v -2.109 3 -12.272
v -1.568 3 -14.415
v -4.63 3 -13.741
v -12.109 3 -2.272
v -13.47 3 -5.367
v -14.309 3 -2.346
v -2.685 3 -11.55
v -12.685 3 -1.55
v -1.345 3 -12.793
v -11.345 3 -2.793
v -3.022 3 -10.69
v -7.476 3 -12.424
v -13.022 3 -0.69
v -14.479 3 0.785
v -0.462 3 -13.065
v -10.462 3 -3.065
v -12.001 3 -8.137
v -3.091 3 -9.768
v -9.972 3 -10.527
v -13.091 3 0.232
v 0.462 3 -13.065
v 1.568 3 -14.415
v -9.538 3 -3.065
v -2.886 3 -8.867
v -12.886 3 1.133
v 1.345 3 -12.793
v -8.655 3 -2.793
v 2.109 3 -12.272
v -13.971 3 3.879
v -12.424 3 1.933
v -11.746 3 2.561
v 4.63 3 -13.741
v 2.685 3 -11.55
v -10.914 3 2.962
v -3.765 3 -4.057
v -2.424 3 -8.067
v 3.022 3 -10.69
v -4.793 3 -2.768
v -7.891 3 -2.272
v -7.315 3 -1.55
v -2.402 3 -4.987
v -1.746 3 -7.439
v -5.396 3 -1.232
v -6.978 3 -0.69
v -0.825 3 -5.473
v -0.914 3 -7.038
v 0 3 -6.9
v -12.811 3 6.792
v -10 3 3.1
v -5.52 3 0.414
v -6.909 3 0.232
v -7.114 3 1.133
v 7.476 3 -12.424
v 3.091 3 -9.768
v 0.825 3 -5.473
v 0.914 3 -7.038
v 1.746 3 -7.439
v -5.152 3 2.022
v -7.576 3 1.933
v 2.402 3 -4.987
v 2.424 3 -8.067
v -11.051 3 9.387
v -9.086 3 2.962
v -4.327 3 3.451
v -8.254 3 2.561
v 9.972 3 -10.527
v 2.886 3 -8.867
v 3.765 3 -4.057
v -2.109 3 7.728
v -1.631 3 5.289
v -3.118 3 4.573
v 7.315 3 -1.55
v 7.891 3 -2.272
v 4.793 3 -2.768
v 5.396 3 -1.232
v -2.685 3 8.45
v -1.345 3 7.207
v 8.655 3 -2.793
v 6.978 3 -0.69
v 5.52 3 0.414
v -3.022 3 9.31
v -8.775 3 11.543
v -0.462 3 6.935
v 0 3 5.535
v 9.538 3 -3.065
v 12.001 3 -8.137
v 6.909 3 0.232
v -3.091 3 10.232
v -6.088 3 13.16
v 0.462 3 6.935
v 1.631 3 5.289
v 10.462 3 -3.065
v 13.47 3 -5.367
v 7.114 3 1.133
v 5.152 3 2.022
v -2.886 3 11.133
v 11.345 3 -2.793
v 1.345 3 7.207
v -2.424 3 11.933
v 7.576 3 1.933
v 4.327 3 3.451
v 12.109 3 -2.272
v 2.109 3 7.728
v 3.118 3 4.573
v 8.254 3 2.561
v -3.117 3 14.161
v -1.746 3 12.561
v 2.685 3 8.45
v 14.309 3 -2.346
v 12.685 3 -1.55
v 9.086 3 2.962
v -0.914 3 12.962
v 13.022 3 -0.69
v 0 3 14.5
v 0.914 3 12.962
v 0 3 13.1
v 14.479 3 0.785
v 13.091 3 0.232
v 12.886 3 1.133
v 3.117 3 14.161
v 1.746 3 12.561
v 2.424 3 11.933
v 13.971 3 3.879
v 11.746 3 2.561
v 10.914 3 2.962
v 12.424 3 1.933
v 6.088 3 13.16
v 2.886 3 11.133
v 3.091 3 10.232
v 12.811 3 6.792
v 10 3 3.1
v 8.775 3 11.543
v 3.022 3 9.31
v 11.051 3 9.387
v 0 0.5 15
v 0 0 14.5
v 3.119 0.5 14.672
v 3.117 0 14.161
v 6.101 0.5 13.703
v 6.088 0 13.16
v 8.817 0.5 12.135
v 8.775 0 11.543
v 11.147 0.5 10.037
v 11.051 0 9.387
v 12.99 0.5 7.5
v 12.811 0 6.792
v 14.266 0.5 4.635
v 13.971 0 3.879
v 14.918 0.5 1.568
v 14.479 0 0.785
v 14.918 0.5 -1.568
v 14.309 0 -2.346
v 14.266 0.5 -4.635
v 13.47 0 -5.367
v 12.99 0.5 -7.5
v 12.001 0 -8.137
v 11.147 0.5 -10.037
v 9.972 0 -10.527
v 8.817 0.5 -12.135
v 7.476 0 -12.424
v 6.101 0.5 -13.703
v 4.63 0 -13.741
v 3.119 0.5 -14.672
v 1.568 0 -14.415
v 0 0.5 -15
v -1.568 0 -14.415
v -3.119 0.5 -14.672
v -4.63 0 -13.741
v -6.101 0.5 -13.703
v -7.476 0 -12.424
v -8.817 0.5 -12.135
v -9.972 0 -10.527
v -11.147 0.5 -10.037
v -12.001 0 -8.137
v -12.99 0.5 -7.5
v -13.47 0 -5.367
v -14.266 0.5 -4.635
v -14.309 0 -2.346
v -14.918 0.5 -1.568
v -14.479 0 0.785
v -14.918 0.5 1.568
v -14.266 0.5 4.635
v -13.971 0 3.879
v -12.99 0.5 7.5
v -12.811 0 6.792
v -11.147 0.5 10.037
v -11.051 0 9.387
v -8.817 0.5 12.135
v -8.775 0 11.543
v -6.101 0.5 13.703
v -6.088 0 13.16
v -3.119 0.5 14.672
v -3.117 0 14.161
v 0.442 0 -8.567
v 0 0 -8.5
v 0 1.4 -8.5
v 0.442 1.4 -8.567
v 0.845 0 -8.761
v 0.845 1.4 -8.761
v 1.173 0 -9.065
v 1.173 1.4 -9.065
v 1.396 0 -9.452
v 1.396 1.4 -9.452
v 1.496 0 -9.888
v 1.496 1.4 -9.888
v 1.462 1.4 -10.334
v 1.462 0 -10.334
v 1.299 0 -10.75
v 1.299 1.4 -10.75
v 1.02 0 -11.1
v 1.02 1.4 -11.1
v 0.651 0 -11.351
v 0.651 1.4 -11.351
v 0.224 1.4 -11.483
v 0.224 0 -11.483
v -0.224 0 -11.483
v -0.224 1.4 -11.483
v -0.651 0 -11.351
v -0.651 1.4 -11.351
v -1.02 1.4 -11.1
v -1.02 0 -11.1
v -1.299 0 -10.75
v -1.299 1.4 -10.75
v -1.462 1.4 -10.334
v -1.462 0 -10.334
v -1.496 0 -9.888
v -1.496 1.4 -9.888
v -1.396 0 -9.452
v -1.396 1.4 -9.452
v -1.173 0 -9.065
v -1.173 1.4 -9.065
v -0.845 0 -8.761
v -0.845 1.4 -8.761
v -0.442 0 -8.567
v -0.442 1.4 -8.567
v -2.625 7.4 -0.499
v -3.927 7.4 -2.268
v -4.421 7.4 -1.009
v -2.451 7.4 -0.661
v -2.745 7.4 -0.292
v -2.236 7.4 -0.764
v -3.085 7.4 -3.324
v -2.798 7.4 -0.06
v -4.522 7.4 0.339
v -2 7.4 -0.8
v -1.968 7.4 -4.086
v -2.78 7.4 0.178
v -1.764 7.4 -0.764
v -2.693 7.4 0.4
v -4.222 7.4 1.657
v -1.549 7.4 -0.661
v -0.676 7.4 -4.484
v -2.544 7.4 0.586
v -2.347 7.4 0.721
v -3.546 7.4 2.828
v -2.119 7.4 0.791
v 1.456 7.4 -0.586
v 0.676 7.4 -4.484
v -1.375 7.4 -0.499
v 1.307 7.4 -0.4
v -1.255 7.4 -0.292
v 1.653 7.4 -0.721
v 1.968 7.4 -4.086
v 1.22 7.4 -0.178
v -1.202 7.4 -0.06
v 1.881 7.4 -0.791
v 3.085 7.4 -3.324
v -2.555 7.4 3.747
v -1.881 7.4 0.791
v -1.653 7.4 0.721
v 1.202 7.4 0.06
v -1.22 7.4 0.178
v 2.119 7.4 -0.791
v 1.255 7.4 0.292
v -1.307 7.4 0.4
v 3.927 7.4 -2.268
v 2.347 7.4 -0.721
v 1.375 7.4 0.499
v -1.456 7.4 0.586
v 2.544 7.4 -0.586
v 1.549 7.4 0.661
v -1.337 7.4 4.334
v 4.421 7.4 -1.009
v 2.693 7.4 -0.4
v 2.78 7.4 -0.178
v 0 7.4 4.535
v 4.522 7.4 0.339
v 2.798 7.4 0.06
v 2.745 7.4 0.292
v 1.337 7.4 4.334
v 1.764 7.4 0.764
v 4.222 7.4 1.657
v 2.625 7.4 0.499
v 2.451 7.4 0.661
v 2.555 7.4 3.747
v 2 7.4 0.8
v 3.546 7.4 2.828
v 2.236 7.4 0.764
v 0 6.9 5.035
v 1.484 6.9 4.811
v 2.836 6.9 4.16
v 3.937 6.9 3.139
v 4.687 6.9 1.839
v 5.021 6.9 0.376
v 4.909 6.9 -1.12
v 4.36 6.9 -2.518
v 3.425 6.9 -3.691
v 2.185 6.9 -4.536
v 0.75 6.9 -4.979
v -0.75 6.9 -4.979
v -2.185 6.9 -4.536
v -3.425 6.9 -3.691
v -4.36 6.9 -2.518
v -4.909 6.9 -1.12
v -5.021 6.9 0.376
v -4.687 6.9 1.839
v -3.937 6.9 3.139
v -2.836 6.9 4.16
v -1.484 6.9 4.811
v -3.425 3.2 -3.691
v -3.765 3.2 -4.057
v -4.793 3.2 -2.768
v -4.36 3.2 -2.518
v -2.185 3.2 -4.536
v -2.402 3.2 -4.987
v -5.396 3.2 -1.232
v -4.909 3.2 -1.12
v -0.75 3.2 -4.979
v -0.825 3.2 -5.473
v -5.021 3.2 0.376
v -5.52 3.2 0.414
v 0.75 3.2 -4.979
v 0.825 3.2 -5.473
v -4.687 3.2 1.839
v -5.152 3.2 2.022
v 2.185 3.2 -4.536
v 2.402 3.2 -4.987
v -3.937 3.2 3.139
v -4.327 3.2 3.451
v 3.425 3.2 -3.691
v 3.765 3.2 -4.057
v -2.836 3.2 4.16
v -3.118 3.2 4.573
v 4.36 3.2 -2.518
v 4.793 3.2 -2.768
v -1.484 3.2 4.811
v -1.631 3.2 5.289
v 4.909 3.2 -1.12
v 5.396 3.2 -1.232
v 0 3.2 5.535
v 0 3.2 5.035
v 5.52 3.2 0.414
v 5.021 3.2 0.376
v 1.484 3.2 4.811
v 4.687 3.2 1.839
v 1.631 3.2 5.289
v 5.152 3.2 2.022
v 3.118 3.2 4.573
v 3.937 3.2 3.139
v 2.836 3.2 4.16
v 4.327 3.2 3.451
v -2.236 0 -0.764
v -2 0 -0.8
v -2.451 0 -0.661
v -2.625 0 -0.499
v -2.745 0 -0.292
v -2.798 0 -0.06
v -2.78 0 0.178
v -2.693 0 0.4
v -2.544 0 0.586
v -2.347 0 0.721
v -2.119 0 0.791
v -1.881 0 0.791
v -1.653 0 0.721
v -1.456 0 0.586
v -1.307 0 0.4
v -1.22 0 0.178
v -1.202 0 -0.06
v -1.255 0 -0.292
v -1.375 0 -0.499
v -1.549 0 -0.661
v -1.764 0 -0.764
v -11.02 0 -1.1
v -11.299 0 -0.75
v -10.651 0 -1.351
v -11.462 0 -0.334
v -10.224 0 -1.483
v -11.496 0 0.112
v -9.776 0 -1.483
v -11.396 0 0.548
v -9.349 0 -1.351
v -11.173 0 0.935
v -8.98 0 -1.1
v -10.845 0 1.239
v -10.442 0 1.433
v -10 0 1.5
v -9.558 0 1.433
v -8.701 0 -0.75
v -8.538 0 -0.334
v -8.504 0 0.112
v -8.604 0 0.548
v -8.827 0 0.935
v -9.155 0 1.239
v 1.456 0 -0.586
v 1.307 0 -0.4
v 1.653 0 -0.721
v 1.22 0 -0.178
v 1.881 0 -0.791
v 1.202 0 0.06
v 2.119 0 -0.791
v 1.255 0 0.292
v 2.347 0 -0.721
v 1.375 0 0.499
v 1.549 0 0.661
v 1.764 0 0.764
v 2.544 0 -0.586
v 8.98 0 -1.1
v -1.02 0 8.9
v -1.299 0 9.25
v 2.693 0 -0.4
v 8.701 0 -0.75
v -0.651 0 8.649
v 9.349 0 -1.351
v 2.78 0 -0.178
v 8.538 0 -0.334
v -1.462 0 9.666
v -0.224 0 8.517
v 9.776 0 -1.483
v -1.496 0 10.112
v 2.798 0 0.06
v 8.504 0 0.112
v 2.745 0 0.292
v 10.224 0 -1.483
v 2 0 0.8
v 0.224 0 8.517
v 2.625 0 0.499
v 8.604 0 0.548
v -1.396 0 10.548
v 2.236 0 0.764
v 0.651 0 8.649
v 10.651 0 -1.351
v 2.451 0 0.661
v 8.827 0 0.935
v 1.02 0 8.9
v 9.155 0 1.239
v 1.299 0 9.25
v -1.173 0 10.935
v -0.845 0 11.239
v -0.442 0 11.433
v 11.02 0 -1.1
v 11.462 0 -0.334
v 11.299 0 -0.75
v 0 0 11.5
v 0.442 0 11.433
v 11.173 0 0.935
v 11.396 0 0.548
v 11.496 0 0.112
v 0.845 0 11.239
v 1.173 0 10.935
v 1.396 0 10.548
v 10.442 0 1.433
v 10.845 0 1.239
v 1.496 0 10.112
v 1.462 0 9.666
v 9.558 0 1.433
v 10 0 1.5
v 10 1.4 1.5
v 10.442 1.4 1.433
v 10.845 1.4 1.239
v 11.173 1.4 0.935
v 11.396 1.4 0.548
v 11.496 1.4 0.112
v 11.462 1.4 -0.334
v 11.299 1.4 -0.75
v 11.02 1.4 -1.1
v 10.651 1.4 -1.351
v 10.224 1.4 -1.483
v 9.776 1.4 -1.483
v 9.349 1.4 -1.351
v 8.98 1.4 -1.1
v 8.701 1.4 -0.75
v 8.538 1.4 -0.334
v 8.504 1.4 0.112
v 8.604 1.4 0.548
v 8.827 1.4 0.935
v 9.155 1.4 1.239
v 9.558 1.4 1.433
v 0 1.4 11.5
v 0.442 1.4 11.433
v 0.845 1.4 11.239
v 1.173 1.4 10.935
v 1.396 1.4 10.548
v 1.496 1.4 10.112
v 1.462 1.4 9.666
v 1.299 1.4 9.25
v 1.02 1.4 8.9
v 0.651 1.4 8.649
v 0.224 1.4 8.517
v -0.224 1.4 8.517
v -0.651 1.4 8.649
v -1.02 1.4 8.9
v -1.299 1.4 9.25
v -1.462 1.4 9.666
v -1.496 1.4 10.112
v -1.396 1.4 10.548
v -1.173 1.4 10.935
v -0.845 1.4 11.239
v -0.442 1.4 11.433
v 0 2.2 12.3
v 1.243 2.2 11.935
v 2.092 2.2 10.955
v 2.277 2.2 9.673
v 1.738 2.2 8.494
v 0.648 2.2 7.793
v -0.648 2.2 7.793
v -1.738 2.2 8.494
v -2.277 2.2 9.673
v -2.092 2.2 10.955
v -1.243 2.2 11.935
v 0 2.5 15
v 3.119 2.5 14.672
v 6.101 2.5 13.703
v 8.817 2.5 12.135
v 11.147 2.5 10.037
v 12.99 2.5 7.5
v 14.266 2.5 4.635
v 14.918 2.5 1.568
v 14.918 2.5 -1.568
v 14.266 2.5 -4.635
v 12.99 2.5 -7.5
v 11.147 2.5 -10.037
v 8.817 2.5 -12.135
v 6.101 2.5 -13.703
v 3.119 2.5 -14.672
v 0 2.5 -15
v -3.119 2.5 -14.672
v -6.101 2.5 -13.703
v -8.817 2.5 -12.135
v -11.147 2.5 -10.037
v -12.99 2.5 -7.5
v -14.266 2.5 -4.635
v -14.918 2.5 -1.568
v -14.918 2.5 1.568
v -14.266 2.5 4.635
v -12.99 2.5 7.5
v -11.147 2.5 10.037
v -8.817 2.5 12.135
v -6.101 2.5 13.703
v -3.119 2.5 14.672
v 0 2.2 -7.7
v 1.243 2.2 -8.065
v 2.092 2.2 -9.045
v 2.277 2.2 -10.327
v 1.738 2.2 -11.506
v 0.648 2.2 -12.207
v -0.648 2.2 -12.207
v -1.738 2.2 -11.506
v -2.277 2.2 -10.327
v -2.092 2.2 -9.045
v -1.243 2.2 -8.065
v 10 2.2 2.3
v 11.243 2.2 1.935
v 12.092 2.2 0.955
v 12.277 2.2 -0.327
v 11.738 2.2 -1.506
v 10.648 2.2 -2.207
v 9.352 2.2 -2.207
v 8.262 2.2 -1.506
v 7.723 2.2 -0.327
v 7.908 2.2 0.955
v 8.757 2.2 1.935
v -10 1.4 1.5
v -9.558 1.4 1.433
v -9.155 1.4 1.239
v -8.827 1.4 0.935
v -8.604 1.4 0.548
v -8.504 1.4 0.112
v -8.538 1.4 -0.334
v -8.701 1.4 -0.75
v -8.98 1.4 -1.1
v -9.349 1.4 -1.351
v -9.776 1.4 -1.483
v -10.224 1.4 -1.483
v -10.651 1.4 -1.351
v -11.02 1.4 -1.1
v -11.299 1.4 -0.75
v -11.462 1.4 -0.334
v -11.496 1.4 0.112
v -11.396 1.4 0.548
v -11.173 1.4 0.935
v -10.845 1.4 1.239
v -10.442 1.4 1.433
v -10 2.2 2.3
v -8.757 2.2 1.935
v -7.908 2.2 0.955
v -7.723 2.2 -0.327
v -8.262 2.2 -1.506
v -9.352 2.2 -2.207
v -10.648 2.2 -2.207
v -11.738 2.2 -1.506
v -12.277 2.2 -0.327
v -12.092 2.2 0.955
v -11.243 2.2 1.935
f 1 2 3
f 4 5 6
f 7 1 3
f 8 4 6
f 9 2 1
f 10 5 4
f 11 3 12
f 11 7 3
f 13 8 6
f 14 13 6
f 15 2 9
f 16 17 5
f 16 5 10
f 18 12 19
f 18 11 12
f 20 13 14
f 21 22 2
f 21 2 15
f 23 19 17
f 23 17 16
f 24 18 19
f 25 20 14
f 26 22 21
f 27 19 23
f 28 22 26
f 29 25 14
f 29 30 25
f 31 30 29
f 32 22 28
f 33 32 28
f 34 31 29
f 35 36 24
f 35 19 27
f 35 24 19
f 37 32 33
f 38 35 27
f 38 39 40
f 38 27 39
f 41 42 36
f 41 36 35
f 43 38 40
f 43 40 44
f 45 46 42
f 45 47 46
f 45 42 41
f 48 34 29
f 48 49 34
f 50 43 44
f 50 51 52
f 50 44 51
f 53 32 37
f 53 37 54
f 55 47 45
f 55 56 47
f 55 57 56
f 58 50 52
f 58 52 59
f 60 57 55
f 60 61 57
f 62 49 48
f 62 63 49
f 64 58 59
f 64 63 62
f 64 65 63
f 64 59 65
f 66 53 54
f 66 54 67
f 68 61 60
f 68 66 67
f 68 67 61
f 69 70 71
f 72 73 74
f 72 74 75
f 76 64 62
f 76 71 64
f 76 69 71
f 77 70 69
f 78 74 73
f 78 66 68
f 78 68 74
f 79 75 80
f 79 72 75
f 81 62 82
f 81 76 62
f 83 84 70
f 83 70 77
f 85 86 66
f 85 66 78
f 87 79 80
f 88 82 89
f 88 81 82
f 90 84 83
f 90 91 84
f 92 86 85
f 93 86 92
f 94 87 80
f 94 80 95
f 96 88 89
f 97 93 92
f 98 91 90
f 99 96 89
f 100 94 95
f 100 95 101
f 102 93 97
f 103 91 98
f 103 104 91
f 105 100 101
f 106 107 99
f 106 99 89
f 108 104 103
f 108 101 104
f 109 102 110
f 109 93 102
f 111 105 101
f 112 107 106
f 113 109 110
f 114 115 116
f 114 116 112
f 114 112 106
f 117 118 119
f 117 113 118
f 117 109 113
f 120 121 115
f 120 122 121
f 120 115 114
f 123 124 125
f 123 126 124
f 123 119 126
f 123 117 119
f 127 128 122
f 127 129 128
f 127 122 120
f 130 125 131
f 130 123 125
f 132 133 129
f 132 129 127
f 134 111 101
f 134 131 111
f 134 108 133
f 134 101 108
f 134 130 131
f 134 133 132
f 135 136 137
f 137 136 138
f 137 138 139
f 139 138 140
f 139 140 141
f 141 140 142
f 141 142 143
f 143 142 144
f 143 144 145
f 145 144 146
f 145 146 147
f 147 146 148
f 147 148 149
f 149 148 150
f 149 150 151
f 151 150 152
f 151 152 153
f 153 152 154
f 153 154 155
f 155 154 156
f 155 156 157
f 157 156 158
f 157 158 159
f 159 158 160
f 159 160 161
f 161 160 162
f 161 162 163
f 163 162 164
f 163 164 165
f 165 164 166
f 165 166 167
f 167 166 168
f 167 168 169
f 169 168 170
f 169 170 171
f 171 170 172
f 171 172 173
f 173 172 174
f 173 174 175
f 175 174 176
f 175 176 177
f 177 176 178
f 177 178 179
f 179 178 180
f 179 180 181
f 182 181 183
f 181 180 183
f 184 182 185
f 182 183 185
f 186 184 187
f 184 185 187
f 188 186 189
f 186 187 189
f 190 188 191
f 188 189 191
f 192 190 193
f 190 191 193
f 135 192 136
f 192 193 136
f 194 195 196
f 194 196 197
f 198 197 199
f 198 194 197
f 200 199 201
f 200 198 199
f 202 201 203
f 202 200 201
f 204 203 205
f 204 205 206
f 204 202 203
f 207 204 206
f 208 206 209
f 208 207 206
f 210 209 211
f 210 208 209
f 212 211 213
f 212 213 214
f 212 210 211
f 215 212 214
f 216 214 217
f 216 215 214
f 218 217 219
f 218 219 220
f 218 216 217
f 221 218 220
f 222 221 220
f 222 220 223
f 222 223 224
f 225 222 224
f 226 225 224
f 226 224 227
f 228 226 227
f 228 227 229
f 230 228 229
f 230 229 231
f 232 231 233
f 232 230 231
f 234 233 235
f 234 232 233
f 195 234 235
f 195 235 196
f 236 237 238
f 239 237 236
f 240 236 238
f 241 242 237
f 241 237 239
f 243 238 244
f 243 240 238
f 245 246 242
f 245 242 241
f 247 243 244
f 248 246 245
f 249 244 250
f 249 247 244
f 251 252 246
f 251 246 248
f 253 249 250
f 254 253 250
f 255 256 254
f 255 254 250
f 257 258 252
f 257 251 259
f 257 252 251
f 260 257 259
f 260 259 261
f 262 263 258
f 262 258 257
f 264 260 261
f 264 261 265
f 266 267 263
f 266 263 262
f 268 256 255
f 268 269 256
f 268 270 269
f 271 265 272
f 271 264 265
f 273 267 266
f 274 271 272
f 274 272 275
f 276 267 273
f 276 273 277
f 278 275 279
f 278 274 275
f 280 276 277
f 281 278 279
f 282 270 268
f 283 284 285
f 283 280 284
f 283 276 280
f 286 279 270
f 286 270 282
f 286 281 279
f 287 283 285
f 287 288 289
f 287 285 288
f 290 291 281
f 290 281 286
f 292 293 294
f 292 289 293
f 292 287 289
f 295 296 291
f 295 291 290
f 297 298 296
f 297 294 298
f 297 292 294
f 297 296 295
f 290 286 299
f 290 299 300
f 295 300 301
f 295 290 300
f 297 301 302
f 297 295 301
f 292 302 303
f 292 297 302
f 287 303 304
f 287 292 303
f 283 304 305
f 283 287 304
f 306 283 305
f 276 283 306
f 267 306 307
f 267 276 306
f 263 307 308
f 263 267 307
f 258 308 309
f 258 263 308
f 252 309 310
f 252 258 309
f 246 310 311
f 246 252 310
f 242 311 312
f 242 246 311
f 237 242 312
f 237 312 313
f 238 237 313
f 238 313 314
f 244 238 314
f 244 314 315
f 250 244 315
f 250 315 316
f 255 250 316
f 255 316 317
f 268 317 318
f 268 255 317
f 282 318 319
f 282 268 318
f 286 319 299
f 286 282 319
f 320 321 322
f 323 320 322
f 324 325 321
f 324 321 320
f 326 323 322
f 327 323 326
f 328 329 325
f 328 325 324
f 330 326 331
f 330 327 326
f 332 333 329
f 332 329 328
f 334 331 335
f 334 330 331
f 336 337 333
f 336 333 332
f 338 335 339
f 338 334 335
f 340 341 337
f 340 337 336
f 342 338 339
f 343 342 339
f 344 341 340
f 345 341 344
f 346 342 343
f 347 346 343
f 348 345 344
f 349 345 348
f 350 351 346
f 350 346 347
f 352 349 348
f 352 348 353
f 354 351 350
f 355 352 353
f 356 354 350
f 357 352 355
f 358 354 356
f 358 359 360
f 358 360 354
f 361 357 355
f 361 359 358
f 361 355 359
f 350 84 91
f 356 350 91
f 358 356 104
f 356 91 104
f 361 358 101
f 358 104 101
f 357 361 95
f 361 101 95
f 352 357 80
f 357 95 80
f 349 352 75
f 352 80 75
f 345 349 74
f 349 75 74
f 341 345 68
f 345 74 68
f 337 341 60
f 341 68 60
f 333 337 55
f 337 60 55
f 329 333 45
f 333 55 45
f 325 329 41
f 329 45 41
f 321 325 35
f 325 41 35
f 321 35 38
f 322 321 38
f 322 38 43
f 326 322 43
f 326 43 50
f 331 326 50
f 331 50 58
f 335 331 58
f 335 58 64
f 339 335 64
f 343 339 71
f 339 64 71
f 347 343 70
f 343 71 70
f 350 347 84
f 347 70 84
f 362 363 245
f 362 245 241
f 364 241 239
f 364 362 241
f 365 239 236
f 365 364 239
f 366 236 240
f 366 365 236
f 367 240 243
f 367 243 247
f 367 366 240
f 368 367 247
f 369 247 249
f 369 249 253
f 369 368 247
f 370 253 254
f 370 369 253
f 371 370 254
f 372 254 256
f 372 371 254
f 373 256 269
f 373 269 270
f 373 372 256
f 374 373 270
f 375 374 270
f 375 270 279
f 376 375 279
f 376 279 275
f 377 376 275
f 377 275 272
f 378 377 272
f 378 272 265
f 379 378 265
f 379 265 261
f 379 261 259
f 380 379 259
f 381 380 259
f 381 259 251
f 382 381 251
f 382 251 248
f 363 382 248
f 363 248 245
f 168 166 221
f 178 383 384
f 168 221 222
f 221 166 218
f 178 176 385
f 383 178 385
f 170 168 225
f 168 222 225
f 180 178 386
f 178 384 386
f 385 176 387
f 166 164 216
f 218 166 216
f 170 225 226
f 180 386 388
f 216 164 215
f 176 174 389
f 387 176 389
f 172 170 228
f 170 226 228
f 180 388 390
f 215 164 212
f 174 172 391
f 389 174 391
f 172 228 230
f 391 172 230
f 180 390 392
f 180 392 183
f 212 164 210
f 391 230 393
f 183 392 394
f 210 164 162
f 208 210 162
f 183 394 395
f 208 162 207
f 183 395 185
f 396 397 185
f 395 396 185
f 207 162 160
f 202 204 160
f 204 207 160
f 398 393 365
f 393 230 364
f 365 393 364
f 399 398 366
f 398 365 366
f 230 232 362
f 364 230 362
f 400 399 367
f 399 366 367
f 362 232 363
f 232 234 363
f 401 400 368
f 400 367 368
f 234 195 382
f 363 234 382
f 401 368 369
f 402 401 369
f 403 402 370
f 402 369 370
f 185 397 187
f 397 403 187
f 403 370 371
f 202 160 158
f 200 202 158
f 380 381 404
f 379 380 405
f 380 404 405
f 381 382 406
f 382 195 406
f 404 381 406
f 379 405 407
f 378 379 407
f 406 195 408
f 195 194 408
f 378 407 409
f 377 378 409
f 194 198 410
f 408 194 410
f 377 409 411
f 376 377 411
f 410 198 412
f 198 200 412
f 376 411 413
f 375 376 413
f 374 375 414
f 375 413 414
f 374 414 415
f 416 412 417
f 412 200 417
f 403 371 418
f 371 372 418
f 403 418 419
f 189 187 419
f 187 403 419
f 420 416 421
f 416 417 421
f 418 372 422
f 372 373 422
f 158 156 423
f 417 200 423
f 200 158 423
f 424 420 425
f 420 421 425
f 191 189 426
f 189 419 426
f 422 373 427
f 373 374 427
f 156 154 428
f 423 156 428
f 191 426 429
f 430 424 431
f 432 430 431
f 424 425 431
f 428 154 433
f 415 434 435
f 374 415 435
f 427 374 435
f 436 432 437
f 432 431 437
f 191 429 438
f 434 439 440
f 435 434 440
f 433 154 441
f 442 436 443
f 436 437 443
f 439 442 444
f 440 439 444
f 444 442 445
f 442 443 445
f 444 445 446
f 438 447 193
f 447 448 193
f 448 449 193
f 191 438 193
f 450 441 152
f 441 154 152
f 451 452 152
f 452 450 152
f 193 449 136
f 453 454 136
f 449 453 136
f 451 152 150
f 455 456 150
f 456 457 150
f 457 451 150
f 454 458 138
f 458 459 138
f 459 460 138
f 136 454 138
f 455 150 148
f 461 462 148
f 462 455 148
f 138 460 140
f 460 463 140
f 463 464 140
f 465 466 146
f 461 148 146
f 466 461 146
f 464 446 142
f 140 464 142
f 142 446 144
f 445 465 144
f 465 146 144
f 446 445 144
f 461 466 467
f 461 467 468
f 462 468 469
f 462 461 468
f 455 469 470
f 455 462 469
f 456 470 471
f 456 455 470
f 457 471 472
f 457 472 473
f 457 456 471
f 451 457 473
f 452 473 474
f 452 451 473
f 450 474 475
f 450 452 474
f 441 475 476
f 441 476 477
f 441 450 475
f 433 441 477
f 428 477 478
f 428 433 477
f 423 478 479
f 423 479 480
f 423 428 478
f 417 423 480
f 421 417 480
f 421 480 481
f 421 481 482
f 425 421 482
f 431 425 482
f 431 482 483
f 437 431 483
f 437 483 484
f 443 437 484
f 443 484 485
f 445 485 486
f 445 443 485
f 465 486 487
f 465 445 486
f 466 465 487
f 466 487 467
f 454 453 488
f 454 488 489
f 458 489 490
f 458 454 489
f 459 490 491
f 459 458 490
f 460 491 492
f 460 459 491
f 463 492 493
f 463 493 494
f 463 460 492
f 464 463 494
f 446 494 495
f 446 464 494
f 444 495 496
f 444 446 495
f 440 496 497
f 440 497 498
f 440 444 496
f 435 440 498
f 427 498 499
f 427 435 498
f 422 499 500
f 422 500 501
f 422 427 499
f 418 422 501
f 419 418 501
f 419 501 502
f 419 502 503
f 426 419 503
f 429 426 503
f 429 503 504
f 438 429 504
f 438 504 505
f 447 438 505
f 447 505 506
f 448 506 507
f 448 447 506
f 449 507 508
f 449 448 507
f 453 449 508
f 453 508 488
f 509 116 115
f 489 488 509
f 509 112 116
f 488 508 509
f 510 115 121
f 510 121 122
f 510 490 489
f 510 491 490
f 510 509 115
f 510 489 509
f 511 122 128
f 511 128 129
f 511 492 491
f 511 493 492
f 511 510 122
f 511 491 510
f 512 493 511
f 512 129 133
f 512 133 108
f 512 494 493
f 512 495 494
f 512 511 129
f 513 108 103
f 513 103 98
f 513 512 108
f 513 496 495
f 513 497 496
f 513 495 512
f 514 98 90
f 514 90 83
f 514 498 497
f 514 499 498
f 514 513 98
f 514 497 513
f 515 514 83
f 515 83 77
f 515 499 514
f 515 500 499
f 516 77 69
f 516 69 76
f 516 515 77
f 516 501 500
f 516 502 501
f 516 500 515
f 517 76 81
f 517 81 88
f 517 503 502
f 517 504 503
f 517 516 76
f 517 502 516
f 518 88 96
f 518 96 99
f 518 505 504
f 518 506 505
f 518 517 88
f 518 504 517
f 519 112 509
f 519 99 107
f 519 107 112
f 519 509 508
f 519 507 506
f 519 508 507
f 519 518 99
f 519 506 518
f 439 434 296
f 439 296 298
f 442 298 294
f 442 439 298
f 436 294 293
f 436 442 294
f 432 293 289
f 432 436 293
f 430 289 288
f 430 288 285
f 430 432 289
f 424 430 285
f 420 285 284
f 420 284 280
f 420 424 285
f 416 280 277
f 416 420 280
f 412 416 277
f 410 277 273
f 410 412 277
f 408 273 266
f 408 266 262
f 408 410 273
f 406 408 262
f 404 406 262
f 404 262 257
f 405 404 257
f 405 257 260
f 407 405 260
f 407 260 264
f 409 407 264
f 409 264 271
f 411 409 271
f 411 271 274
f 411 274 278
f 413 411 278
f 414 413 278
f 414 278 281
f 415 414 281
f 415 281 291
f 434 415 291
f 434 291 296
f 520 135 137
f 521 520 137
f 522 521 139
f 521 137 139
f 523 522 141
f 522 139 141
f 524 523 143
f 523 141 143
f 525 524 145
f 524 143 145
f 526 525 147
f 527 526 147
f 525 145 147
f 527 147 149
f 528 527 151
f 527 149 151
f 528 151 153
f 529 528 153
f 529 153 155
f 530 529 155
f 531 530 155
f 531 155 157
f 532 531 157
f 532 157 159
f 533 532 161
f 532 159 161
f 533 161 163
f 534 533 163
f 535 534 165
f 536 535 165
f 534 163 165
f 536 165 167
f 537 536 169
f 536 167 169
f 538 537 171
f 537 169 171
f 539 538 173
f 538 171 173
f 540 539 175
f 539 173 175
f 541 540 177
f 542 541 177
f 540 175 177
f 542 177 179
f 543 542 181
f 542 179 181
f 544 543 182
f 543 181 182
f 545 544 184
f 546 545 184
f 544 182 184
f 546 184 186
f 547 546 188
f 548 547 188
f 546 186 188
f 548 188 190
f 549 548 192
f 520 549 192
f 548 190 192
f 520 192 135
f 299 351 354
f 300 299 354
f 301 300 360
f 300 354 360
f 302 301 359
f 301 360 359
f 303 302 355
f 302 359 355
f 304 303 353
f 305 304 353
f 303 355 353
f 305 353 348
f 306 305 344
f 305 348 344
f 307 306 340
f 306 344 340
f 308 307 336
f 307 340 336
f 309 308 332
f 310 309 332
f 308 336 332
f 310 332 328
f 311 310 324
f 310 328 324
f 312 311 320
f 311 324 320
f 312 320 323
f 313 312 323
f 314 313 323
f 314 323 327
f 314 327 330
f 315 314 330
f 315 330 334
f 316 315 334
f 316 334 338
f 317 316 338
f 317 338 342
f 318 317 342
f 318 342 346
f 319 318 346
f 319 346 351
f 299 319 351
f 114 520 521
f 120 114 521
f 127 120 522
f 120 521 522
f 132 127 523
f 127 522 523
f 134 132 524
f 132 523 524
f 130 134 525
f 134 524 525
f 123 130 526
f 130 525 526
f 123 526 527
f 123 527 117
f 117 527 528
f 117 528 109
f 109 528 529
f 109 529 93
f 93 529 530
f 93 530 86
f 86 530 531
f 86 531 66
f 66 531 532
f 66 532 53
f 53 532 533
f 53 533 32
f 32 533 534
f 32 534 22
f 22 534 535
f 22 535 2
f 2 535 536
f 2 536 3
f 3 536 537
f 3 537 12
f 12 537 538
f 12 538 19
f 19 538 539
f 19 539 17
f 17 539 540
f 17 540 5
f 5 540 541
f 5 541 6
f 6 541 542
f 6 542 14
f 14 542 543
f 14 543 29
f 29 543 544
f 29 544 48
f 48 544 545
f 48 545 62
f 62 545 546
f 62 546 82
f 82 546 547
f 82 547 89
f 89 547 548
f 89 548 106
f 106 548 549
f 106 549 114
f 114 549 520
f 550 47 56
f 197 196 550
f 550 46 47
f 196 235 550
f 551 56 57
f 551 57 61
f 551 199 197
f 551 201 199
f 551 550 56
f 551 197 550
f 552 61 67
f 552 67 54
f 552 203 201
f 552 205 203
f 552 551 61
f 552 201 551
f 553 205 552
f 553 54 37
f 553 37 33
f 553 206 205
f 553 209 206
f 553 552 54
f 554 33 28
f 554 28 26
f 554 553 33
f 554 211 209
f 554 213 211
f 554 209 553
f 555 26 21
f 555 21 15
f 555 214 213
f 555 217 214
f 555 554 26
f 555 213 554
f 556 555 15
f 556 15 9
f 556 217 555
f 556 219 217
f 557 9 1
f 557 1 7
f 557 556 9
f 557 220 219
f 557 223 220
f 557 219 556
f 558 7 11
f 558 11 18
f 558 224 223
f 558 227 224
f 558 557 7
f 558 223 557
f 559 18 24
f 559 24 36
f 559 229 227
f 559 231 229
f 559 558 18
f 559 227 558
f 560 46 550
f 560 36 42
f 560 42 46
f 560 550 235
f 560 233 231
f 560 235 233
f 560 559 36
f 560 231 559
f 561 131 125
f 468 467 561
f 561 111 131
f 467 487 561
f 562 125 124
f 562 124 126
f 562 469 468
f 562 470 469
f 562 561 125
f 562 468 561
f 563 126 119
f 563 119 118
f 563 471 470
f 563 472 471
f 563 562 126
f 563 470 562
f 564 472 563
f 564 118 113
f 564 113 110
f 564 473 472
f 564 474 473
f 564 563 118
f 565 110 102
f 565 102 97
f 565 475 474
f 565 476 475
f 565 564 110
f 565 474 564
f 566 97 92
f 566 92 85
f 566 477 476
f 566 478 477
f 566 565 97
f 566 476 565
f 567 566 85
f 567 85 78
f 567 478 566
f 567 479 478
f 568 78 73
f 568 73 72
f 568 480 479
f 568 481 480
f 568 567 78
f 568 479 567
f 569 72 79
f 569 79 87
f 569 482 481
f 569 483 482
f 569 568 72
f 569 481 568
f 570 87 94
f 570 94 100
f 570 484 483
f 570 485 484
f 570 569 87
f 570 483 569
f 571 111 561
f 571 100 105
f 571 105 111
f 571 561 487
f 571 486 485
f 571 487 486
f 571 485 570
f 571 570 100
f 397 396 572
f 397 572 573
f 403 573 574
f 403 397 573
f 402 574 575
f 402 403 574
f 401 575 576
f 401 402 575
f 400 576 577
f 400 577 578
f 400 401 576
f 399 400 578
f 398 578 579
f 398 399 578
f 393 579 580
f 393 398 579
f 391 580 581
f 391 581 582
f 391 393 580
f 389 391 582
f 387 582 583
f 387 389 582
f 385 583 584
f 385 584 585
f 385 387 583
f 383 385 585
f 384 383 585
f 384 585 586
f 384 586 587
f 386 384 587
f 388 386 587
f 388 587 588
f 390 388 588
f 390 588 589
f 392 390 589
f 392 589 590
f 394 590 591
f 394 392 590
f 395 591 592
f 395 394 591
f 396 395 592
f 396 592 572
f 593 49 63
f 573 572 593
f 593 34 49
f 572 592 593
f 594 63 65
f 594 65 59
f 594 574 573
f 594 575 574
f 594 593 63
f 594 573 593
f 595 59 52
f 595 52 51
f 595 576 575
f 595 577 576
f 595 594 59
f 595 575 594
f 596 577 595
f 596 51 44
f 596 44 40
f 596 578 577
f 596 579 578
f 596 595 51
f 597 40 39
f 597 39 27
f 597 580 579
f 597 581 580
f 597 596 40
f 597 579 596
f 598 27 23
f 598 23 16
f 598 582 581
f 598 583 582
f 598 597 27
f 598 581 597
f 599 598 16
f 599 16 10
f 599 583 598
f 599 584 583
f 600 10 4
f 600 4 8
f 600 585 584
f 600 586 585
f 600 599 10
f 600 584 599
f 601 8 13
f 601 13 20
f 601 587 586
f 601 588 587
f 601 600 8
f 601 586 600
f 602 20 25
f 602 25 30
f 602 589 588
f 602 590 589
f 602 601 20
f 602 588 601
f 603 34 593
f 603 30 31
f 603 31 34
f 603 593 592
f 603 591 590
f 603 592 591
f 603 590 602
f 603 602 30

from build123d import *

# Parameters (mm, degrees)
SKETCH_1_R          = 15
SKETCH_1_R_2        = 1.5
EXTRUDE_1_DEPTH     = 3
SKETCH_2_R          = 5.035
SKETCH_2_R_2        = 0.8
EXTRUDE_2_DEPTH     = 4.4
SKETCH_4_R          = 5.535
EXTRUDE_3_DEPTH     = 0.2
CHAMFER_1_SIZE      = 0.5
CHAMFER_3_SIZE      = 0.5
CHAMFER_4_SIZE      = 1.6
CUT_EXTRUDE_START   = -10
SKETCH_5_R          = 0.8
CUT_EXTRUDE_1_DEPTH = 10


with BuildPart() as part:
    # 草图1 → 凸台-拉伸1 (new body)
    with BuildSketch(Plane(origin=(0, 0, 0), x_dir=(1, 0, 0), z_dir=(0, 1, 0))):
        with Locations(Location((0, 0, 0), (0, 0, 270))):
            Circle(SKETCH_1_R)
        with Locations(Location((0, 10, 0), (0, 0, 270))):
            Circle(SKETCH_1_R_2, mode=Mode.SUBTRACT)
        with Locations(Location((10, 0, 0), (0, 0, 270))):
            Circle(SKETCH_1_R_2, mode=Mode.SUBTRACT)
        with Locations(Location((0, -10, 0), (0, 0, 270))):
            Circle(SKETCH_1_R_2, mode=Mode.SUBTRACT)
        with Locations(Location((-10, 0, 0), (0, 0, 270))):
            Circle(SKETCH_1_R_2, mode=Mode.SUBTRACT)
    extrude(amount=EXTRUDE_1_DEPTH)

    # 草图2 → 凸台-拉伸2 (add)
    with BuildSketch(Plane(origin=(0, 3, 0), x_dir=(1, 0, 0), z_dir=(0, 1, 0))):
        with Locations(Location((0, 0, 0), (0, 0, 270))):
            Circle(SKETCH_2_R)
        with Locations(Location((2, 0, 0), (0, 0, 270))):
            Circle(SKETCH_2_R_2, mode=Mode.SUBTRACT)
        with Locations(Location((-2, 0, 0), (0, 0, 90))):
            Circle(SKETCH_2_R_2, mode=Mode.SUBTRACT)
    extrude(amount=EXTRUDE_2_DEPTH)

    # 草图4 → 凸台-拉伸3 (add)
    with BuildSketch(Plane(origin=(0, 3, 0), x_dir=(1, 0, 0), z_dir=(0, 1, 0))):
        with Locations(Location((0, 0, 0), (0, 0, 270))):
            Circle(SKETCH_4_R)
    extrude(amount=EXTRUDE_3_DEPTH)

    # 倒角1
    chamfer_1_edges = [part.edges().sort_by_distance(p)[0] for p in [
        (0, 7.4, -5.035),
    ]]
    chamfer(chamfer_1_edges, length=CHAMFER_1_SIZE)

    # 倒角3
    chamfer_3_edges = [part.edges().sort_by_distance(p)[0] for p in [
        (0, 0, -15),
        (0, 3, -15),
    ]]
    chamfer(chamfer_3_edges, length=CHAMFER_3_SIZE)

    # 倒角4
    chamfer_4_edges = [part.edges().sort_by_distance(p)[0] for p in [
        (0, 3, 8.5),
        (-10, 3, -1.5),
        (0, 3, -11.5),
        (10, 3, -1.5),
    ]]
    chamfer(chamfer_4_edges, length=CHAMFER_4_SIZE)

    # 草图5 → 切除-拉伸1 (cut)
    with BuildSketch(Plane(origin=(0, 7.4, 0), x_dir=(1, 0, 0), z_dir=(0, 1, 0)).offset(CUT_EXTRUDE_START)):
        with Locations(Location((2, 0, 0), (0, 0, 270))):
            Circle(SKETCH_5_R)
        with Locations(Location((-2, 0, 0), (0, 0, 90))):
            Circle(SKETCH_5_R)
    extrude(amount=CUT_EXTRUDE_1_DEPTH, mode=Mode.SUBTRACT)


solid = part.part
